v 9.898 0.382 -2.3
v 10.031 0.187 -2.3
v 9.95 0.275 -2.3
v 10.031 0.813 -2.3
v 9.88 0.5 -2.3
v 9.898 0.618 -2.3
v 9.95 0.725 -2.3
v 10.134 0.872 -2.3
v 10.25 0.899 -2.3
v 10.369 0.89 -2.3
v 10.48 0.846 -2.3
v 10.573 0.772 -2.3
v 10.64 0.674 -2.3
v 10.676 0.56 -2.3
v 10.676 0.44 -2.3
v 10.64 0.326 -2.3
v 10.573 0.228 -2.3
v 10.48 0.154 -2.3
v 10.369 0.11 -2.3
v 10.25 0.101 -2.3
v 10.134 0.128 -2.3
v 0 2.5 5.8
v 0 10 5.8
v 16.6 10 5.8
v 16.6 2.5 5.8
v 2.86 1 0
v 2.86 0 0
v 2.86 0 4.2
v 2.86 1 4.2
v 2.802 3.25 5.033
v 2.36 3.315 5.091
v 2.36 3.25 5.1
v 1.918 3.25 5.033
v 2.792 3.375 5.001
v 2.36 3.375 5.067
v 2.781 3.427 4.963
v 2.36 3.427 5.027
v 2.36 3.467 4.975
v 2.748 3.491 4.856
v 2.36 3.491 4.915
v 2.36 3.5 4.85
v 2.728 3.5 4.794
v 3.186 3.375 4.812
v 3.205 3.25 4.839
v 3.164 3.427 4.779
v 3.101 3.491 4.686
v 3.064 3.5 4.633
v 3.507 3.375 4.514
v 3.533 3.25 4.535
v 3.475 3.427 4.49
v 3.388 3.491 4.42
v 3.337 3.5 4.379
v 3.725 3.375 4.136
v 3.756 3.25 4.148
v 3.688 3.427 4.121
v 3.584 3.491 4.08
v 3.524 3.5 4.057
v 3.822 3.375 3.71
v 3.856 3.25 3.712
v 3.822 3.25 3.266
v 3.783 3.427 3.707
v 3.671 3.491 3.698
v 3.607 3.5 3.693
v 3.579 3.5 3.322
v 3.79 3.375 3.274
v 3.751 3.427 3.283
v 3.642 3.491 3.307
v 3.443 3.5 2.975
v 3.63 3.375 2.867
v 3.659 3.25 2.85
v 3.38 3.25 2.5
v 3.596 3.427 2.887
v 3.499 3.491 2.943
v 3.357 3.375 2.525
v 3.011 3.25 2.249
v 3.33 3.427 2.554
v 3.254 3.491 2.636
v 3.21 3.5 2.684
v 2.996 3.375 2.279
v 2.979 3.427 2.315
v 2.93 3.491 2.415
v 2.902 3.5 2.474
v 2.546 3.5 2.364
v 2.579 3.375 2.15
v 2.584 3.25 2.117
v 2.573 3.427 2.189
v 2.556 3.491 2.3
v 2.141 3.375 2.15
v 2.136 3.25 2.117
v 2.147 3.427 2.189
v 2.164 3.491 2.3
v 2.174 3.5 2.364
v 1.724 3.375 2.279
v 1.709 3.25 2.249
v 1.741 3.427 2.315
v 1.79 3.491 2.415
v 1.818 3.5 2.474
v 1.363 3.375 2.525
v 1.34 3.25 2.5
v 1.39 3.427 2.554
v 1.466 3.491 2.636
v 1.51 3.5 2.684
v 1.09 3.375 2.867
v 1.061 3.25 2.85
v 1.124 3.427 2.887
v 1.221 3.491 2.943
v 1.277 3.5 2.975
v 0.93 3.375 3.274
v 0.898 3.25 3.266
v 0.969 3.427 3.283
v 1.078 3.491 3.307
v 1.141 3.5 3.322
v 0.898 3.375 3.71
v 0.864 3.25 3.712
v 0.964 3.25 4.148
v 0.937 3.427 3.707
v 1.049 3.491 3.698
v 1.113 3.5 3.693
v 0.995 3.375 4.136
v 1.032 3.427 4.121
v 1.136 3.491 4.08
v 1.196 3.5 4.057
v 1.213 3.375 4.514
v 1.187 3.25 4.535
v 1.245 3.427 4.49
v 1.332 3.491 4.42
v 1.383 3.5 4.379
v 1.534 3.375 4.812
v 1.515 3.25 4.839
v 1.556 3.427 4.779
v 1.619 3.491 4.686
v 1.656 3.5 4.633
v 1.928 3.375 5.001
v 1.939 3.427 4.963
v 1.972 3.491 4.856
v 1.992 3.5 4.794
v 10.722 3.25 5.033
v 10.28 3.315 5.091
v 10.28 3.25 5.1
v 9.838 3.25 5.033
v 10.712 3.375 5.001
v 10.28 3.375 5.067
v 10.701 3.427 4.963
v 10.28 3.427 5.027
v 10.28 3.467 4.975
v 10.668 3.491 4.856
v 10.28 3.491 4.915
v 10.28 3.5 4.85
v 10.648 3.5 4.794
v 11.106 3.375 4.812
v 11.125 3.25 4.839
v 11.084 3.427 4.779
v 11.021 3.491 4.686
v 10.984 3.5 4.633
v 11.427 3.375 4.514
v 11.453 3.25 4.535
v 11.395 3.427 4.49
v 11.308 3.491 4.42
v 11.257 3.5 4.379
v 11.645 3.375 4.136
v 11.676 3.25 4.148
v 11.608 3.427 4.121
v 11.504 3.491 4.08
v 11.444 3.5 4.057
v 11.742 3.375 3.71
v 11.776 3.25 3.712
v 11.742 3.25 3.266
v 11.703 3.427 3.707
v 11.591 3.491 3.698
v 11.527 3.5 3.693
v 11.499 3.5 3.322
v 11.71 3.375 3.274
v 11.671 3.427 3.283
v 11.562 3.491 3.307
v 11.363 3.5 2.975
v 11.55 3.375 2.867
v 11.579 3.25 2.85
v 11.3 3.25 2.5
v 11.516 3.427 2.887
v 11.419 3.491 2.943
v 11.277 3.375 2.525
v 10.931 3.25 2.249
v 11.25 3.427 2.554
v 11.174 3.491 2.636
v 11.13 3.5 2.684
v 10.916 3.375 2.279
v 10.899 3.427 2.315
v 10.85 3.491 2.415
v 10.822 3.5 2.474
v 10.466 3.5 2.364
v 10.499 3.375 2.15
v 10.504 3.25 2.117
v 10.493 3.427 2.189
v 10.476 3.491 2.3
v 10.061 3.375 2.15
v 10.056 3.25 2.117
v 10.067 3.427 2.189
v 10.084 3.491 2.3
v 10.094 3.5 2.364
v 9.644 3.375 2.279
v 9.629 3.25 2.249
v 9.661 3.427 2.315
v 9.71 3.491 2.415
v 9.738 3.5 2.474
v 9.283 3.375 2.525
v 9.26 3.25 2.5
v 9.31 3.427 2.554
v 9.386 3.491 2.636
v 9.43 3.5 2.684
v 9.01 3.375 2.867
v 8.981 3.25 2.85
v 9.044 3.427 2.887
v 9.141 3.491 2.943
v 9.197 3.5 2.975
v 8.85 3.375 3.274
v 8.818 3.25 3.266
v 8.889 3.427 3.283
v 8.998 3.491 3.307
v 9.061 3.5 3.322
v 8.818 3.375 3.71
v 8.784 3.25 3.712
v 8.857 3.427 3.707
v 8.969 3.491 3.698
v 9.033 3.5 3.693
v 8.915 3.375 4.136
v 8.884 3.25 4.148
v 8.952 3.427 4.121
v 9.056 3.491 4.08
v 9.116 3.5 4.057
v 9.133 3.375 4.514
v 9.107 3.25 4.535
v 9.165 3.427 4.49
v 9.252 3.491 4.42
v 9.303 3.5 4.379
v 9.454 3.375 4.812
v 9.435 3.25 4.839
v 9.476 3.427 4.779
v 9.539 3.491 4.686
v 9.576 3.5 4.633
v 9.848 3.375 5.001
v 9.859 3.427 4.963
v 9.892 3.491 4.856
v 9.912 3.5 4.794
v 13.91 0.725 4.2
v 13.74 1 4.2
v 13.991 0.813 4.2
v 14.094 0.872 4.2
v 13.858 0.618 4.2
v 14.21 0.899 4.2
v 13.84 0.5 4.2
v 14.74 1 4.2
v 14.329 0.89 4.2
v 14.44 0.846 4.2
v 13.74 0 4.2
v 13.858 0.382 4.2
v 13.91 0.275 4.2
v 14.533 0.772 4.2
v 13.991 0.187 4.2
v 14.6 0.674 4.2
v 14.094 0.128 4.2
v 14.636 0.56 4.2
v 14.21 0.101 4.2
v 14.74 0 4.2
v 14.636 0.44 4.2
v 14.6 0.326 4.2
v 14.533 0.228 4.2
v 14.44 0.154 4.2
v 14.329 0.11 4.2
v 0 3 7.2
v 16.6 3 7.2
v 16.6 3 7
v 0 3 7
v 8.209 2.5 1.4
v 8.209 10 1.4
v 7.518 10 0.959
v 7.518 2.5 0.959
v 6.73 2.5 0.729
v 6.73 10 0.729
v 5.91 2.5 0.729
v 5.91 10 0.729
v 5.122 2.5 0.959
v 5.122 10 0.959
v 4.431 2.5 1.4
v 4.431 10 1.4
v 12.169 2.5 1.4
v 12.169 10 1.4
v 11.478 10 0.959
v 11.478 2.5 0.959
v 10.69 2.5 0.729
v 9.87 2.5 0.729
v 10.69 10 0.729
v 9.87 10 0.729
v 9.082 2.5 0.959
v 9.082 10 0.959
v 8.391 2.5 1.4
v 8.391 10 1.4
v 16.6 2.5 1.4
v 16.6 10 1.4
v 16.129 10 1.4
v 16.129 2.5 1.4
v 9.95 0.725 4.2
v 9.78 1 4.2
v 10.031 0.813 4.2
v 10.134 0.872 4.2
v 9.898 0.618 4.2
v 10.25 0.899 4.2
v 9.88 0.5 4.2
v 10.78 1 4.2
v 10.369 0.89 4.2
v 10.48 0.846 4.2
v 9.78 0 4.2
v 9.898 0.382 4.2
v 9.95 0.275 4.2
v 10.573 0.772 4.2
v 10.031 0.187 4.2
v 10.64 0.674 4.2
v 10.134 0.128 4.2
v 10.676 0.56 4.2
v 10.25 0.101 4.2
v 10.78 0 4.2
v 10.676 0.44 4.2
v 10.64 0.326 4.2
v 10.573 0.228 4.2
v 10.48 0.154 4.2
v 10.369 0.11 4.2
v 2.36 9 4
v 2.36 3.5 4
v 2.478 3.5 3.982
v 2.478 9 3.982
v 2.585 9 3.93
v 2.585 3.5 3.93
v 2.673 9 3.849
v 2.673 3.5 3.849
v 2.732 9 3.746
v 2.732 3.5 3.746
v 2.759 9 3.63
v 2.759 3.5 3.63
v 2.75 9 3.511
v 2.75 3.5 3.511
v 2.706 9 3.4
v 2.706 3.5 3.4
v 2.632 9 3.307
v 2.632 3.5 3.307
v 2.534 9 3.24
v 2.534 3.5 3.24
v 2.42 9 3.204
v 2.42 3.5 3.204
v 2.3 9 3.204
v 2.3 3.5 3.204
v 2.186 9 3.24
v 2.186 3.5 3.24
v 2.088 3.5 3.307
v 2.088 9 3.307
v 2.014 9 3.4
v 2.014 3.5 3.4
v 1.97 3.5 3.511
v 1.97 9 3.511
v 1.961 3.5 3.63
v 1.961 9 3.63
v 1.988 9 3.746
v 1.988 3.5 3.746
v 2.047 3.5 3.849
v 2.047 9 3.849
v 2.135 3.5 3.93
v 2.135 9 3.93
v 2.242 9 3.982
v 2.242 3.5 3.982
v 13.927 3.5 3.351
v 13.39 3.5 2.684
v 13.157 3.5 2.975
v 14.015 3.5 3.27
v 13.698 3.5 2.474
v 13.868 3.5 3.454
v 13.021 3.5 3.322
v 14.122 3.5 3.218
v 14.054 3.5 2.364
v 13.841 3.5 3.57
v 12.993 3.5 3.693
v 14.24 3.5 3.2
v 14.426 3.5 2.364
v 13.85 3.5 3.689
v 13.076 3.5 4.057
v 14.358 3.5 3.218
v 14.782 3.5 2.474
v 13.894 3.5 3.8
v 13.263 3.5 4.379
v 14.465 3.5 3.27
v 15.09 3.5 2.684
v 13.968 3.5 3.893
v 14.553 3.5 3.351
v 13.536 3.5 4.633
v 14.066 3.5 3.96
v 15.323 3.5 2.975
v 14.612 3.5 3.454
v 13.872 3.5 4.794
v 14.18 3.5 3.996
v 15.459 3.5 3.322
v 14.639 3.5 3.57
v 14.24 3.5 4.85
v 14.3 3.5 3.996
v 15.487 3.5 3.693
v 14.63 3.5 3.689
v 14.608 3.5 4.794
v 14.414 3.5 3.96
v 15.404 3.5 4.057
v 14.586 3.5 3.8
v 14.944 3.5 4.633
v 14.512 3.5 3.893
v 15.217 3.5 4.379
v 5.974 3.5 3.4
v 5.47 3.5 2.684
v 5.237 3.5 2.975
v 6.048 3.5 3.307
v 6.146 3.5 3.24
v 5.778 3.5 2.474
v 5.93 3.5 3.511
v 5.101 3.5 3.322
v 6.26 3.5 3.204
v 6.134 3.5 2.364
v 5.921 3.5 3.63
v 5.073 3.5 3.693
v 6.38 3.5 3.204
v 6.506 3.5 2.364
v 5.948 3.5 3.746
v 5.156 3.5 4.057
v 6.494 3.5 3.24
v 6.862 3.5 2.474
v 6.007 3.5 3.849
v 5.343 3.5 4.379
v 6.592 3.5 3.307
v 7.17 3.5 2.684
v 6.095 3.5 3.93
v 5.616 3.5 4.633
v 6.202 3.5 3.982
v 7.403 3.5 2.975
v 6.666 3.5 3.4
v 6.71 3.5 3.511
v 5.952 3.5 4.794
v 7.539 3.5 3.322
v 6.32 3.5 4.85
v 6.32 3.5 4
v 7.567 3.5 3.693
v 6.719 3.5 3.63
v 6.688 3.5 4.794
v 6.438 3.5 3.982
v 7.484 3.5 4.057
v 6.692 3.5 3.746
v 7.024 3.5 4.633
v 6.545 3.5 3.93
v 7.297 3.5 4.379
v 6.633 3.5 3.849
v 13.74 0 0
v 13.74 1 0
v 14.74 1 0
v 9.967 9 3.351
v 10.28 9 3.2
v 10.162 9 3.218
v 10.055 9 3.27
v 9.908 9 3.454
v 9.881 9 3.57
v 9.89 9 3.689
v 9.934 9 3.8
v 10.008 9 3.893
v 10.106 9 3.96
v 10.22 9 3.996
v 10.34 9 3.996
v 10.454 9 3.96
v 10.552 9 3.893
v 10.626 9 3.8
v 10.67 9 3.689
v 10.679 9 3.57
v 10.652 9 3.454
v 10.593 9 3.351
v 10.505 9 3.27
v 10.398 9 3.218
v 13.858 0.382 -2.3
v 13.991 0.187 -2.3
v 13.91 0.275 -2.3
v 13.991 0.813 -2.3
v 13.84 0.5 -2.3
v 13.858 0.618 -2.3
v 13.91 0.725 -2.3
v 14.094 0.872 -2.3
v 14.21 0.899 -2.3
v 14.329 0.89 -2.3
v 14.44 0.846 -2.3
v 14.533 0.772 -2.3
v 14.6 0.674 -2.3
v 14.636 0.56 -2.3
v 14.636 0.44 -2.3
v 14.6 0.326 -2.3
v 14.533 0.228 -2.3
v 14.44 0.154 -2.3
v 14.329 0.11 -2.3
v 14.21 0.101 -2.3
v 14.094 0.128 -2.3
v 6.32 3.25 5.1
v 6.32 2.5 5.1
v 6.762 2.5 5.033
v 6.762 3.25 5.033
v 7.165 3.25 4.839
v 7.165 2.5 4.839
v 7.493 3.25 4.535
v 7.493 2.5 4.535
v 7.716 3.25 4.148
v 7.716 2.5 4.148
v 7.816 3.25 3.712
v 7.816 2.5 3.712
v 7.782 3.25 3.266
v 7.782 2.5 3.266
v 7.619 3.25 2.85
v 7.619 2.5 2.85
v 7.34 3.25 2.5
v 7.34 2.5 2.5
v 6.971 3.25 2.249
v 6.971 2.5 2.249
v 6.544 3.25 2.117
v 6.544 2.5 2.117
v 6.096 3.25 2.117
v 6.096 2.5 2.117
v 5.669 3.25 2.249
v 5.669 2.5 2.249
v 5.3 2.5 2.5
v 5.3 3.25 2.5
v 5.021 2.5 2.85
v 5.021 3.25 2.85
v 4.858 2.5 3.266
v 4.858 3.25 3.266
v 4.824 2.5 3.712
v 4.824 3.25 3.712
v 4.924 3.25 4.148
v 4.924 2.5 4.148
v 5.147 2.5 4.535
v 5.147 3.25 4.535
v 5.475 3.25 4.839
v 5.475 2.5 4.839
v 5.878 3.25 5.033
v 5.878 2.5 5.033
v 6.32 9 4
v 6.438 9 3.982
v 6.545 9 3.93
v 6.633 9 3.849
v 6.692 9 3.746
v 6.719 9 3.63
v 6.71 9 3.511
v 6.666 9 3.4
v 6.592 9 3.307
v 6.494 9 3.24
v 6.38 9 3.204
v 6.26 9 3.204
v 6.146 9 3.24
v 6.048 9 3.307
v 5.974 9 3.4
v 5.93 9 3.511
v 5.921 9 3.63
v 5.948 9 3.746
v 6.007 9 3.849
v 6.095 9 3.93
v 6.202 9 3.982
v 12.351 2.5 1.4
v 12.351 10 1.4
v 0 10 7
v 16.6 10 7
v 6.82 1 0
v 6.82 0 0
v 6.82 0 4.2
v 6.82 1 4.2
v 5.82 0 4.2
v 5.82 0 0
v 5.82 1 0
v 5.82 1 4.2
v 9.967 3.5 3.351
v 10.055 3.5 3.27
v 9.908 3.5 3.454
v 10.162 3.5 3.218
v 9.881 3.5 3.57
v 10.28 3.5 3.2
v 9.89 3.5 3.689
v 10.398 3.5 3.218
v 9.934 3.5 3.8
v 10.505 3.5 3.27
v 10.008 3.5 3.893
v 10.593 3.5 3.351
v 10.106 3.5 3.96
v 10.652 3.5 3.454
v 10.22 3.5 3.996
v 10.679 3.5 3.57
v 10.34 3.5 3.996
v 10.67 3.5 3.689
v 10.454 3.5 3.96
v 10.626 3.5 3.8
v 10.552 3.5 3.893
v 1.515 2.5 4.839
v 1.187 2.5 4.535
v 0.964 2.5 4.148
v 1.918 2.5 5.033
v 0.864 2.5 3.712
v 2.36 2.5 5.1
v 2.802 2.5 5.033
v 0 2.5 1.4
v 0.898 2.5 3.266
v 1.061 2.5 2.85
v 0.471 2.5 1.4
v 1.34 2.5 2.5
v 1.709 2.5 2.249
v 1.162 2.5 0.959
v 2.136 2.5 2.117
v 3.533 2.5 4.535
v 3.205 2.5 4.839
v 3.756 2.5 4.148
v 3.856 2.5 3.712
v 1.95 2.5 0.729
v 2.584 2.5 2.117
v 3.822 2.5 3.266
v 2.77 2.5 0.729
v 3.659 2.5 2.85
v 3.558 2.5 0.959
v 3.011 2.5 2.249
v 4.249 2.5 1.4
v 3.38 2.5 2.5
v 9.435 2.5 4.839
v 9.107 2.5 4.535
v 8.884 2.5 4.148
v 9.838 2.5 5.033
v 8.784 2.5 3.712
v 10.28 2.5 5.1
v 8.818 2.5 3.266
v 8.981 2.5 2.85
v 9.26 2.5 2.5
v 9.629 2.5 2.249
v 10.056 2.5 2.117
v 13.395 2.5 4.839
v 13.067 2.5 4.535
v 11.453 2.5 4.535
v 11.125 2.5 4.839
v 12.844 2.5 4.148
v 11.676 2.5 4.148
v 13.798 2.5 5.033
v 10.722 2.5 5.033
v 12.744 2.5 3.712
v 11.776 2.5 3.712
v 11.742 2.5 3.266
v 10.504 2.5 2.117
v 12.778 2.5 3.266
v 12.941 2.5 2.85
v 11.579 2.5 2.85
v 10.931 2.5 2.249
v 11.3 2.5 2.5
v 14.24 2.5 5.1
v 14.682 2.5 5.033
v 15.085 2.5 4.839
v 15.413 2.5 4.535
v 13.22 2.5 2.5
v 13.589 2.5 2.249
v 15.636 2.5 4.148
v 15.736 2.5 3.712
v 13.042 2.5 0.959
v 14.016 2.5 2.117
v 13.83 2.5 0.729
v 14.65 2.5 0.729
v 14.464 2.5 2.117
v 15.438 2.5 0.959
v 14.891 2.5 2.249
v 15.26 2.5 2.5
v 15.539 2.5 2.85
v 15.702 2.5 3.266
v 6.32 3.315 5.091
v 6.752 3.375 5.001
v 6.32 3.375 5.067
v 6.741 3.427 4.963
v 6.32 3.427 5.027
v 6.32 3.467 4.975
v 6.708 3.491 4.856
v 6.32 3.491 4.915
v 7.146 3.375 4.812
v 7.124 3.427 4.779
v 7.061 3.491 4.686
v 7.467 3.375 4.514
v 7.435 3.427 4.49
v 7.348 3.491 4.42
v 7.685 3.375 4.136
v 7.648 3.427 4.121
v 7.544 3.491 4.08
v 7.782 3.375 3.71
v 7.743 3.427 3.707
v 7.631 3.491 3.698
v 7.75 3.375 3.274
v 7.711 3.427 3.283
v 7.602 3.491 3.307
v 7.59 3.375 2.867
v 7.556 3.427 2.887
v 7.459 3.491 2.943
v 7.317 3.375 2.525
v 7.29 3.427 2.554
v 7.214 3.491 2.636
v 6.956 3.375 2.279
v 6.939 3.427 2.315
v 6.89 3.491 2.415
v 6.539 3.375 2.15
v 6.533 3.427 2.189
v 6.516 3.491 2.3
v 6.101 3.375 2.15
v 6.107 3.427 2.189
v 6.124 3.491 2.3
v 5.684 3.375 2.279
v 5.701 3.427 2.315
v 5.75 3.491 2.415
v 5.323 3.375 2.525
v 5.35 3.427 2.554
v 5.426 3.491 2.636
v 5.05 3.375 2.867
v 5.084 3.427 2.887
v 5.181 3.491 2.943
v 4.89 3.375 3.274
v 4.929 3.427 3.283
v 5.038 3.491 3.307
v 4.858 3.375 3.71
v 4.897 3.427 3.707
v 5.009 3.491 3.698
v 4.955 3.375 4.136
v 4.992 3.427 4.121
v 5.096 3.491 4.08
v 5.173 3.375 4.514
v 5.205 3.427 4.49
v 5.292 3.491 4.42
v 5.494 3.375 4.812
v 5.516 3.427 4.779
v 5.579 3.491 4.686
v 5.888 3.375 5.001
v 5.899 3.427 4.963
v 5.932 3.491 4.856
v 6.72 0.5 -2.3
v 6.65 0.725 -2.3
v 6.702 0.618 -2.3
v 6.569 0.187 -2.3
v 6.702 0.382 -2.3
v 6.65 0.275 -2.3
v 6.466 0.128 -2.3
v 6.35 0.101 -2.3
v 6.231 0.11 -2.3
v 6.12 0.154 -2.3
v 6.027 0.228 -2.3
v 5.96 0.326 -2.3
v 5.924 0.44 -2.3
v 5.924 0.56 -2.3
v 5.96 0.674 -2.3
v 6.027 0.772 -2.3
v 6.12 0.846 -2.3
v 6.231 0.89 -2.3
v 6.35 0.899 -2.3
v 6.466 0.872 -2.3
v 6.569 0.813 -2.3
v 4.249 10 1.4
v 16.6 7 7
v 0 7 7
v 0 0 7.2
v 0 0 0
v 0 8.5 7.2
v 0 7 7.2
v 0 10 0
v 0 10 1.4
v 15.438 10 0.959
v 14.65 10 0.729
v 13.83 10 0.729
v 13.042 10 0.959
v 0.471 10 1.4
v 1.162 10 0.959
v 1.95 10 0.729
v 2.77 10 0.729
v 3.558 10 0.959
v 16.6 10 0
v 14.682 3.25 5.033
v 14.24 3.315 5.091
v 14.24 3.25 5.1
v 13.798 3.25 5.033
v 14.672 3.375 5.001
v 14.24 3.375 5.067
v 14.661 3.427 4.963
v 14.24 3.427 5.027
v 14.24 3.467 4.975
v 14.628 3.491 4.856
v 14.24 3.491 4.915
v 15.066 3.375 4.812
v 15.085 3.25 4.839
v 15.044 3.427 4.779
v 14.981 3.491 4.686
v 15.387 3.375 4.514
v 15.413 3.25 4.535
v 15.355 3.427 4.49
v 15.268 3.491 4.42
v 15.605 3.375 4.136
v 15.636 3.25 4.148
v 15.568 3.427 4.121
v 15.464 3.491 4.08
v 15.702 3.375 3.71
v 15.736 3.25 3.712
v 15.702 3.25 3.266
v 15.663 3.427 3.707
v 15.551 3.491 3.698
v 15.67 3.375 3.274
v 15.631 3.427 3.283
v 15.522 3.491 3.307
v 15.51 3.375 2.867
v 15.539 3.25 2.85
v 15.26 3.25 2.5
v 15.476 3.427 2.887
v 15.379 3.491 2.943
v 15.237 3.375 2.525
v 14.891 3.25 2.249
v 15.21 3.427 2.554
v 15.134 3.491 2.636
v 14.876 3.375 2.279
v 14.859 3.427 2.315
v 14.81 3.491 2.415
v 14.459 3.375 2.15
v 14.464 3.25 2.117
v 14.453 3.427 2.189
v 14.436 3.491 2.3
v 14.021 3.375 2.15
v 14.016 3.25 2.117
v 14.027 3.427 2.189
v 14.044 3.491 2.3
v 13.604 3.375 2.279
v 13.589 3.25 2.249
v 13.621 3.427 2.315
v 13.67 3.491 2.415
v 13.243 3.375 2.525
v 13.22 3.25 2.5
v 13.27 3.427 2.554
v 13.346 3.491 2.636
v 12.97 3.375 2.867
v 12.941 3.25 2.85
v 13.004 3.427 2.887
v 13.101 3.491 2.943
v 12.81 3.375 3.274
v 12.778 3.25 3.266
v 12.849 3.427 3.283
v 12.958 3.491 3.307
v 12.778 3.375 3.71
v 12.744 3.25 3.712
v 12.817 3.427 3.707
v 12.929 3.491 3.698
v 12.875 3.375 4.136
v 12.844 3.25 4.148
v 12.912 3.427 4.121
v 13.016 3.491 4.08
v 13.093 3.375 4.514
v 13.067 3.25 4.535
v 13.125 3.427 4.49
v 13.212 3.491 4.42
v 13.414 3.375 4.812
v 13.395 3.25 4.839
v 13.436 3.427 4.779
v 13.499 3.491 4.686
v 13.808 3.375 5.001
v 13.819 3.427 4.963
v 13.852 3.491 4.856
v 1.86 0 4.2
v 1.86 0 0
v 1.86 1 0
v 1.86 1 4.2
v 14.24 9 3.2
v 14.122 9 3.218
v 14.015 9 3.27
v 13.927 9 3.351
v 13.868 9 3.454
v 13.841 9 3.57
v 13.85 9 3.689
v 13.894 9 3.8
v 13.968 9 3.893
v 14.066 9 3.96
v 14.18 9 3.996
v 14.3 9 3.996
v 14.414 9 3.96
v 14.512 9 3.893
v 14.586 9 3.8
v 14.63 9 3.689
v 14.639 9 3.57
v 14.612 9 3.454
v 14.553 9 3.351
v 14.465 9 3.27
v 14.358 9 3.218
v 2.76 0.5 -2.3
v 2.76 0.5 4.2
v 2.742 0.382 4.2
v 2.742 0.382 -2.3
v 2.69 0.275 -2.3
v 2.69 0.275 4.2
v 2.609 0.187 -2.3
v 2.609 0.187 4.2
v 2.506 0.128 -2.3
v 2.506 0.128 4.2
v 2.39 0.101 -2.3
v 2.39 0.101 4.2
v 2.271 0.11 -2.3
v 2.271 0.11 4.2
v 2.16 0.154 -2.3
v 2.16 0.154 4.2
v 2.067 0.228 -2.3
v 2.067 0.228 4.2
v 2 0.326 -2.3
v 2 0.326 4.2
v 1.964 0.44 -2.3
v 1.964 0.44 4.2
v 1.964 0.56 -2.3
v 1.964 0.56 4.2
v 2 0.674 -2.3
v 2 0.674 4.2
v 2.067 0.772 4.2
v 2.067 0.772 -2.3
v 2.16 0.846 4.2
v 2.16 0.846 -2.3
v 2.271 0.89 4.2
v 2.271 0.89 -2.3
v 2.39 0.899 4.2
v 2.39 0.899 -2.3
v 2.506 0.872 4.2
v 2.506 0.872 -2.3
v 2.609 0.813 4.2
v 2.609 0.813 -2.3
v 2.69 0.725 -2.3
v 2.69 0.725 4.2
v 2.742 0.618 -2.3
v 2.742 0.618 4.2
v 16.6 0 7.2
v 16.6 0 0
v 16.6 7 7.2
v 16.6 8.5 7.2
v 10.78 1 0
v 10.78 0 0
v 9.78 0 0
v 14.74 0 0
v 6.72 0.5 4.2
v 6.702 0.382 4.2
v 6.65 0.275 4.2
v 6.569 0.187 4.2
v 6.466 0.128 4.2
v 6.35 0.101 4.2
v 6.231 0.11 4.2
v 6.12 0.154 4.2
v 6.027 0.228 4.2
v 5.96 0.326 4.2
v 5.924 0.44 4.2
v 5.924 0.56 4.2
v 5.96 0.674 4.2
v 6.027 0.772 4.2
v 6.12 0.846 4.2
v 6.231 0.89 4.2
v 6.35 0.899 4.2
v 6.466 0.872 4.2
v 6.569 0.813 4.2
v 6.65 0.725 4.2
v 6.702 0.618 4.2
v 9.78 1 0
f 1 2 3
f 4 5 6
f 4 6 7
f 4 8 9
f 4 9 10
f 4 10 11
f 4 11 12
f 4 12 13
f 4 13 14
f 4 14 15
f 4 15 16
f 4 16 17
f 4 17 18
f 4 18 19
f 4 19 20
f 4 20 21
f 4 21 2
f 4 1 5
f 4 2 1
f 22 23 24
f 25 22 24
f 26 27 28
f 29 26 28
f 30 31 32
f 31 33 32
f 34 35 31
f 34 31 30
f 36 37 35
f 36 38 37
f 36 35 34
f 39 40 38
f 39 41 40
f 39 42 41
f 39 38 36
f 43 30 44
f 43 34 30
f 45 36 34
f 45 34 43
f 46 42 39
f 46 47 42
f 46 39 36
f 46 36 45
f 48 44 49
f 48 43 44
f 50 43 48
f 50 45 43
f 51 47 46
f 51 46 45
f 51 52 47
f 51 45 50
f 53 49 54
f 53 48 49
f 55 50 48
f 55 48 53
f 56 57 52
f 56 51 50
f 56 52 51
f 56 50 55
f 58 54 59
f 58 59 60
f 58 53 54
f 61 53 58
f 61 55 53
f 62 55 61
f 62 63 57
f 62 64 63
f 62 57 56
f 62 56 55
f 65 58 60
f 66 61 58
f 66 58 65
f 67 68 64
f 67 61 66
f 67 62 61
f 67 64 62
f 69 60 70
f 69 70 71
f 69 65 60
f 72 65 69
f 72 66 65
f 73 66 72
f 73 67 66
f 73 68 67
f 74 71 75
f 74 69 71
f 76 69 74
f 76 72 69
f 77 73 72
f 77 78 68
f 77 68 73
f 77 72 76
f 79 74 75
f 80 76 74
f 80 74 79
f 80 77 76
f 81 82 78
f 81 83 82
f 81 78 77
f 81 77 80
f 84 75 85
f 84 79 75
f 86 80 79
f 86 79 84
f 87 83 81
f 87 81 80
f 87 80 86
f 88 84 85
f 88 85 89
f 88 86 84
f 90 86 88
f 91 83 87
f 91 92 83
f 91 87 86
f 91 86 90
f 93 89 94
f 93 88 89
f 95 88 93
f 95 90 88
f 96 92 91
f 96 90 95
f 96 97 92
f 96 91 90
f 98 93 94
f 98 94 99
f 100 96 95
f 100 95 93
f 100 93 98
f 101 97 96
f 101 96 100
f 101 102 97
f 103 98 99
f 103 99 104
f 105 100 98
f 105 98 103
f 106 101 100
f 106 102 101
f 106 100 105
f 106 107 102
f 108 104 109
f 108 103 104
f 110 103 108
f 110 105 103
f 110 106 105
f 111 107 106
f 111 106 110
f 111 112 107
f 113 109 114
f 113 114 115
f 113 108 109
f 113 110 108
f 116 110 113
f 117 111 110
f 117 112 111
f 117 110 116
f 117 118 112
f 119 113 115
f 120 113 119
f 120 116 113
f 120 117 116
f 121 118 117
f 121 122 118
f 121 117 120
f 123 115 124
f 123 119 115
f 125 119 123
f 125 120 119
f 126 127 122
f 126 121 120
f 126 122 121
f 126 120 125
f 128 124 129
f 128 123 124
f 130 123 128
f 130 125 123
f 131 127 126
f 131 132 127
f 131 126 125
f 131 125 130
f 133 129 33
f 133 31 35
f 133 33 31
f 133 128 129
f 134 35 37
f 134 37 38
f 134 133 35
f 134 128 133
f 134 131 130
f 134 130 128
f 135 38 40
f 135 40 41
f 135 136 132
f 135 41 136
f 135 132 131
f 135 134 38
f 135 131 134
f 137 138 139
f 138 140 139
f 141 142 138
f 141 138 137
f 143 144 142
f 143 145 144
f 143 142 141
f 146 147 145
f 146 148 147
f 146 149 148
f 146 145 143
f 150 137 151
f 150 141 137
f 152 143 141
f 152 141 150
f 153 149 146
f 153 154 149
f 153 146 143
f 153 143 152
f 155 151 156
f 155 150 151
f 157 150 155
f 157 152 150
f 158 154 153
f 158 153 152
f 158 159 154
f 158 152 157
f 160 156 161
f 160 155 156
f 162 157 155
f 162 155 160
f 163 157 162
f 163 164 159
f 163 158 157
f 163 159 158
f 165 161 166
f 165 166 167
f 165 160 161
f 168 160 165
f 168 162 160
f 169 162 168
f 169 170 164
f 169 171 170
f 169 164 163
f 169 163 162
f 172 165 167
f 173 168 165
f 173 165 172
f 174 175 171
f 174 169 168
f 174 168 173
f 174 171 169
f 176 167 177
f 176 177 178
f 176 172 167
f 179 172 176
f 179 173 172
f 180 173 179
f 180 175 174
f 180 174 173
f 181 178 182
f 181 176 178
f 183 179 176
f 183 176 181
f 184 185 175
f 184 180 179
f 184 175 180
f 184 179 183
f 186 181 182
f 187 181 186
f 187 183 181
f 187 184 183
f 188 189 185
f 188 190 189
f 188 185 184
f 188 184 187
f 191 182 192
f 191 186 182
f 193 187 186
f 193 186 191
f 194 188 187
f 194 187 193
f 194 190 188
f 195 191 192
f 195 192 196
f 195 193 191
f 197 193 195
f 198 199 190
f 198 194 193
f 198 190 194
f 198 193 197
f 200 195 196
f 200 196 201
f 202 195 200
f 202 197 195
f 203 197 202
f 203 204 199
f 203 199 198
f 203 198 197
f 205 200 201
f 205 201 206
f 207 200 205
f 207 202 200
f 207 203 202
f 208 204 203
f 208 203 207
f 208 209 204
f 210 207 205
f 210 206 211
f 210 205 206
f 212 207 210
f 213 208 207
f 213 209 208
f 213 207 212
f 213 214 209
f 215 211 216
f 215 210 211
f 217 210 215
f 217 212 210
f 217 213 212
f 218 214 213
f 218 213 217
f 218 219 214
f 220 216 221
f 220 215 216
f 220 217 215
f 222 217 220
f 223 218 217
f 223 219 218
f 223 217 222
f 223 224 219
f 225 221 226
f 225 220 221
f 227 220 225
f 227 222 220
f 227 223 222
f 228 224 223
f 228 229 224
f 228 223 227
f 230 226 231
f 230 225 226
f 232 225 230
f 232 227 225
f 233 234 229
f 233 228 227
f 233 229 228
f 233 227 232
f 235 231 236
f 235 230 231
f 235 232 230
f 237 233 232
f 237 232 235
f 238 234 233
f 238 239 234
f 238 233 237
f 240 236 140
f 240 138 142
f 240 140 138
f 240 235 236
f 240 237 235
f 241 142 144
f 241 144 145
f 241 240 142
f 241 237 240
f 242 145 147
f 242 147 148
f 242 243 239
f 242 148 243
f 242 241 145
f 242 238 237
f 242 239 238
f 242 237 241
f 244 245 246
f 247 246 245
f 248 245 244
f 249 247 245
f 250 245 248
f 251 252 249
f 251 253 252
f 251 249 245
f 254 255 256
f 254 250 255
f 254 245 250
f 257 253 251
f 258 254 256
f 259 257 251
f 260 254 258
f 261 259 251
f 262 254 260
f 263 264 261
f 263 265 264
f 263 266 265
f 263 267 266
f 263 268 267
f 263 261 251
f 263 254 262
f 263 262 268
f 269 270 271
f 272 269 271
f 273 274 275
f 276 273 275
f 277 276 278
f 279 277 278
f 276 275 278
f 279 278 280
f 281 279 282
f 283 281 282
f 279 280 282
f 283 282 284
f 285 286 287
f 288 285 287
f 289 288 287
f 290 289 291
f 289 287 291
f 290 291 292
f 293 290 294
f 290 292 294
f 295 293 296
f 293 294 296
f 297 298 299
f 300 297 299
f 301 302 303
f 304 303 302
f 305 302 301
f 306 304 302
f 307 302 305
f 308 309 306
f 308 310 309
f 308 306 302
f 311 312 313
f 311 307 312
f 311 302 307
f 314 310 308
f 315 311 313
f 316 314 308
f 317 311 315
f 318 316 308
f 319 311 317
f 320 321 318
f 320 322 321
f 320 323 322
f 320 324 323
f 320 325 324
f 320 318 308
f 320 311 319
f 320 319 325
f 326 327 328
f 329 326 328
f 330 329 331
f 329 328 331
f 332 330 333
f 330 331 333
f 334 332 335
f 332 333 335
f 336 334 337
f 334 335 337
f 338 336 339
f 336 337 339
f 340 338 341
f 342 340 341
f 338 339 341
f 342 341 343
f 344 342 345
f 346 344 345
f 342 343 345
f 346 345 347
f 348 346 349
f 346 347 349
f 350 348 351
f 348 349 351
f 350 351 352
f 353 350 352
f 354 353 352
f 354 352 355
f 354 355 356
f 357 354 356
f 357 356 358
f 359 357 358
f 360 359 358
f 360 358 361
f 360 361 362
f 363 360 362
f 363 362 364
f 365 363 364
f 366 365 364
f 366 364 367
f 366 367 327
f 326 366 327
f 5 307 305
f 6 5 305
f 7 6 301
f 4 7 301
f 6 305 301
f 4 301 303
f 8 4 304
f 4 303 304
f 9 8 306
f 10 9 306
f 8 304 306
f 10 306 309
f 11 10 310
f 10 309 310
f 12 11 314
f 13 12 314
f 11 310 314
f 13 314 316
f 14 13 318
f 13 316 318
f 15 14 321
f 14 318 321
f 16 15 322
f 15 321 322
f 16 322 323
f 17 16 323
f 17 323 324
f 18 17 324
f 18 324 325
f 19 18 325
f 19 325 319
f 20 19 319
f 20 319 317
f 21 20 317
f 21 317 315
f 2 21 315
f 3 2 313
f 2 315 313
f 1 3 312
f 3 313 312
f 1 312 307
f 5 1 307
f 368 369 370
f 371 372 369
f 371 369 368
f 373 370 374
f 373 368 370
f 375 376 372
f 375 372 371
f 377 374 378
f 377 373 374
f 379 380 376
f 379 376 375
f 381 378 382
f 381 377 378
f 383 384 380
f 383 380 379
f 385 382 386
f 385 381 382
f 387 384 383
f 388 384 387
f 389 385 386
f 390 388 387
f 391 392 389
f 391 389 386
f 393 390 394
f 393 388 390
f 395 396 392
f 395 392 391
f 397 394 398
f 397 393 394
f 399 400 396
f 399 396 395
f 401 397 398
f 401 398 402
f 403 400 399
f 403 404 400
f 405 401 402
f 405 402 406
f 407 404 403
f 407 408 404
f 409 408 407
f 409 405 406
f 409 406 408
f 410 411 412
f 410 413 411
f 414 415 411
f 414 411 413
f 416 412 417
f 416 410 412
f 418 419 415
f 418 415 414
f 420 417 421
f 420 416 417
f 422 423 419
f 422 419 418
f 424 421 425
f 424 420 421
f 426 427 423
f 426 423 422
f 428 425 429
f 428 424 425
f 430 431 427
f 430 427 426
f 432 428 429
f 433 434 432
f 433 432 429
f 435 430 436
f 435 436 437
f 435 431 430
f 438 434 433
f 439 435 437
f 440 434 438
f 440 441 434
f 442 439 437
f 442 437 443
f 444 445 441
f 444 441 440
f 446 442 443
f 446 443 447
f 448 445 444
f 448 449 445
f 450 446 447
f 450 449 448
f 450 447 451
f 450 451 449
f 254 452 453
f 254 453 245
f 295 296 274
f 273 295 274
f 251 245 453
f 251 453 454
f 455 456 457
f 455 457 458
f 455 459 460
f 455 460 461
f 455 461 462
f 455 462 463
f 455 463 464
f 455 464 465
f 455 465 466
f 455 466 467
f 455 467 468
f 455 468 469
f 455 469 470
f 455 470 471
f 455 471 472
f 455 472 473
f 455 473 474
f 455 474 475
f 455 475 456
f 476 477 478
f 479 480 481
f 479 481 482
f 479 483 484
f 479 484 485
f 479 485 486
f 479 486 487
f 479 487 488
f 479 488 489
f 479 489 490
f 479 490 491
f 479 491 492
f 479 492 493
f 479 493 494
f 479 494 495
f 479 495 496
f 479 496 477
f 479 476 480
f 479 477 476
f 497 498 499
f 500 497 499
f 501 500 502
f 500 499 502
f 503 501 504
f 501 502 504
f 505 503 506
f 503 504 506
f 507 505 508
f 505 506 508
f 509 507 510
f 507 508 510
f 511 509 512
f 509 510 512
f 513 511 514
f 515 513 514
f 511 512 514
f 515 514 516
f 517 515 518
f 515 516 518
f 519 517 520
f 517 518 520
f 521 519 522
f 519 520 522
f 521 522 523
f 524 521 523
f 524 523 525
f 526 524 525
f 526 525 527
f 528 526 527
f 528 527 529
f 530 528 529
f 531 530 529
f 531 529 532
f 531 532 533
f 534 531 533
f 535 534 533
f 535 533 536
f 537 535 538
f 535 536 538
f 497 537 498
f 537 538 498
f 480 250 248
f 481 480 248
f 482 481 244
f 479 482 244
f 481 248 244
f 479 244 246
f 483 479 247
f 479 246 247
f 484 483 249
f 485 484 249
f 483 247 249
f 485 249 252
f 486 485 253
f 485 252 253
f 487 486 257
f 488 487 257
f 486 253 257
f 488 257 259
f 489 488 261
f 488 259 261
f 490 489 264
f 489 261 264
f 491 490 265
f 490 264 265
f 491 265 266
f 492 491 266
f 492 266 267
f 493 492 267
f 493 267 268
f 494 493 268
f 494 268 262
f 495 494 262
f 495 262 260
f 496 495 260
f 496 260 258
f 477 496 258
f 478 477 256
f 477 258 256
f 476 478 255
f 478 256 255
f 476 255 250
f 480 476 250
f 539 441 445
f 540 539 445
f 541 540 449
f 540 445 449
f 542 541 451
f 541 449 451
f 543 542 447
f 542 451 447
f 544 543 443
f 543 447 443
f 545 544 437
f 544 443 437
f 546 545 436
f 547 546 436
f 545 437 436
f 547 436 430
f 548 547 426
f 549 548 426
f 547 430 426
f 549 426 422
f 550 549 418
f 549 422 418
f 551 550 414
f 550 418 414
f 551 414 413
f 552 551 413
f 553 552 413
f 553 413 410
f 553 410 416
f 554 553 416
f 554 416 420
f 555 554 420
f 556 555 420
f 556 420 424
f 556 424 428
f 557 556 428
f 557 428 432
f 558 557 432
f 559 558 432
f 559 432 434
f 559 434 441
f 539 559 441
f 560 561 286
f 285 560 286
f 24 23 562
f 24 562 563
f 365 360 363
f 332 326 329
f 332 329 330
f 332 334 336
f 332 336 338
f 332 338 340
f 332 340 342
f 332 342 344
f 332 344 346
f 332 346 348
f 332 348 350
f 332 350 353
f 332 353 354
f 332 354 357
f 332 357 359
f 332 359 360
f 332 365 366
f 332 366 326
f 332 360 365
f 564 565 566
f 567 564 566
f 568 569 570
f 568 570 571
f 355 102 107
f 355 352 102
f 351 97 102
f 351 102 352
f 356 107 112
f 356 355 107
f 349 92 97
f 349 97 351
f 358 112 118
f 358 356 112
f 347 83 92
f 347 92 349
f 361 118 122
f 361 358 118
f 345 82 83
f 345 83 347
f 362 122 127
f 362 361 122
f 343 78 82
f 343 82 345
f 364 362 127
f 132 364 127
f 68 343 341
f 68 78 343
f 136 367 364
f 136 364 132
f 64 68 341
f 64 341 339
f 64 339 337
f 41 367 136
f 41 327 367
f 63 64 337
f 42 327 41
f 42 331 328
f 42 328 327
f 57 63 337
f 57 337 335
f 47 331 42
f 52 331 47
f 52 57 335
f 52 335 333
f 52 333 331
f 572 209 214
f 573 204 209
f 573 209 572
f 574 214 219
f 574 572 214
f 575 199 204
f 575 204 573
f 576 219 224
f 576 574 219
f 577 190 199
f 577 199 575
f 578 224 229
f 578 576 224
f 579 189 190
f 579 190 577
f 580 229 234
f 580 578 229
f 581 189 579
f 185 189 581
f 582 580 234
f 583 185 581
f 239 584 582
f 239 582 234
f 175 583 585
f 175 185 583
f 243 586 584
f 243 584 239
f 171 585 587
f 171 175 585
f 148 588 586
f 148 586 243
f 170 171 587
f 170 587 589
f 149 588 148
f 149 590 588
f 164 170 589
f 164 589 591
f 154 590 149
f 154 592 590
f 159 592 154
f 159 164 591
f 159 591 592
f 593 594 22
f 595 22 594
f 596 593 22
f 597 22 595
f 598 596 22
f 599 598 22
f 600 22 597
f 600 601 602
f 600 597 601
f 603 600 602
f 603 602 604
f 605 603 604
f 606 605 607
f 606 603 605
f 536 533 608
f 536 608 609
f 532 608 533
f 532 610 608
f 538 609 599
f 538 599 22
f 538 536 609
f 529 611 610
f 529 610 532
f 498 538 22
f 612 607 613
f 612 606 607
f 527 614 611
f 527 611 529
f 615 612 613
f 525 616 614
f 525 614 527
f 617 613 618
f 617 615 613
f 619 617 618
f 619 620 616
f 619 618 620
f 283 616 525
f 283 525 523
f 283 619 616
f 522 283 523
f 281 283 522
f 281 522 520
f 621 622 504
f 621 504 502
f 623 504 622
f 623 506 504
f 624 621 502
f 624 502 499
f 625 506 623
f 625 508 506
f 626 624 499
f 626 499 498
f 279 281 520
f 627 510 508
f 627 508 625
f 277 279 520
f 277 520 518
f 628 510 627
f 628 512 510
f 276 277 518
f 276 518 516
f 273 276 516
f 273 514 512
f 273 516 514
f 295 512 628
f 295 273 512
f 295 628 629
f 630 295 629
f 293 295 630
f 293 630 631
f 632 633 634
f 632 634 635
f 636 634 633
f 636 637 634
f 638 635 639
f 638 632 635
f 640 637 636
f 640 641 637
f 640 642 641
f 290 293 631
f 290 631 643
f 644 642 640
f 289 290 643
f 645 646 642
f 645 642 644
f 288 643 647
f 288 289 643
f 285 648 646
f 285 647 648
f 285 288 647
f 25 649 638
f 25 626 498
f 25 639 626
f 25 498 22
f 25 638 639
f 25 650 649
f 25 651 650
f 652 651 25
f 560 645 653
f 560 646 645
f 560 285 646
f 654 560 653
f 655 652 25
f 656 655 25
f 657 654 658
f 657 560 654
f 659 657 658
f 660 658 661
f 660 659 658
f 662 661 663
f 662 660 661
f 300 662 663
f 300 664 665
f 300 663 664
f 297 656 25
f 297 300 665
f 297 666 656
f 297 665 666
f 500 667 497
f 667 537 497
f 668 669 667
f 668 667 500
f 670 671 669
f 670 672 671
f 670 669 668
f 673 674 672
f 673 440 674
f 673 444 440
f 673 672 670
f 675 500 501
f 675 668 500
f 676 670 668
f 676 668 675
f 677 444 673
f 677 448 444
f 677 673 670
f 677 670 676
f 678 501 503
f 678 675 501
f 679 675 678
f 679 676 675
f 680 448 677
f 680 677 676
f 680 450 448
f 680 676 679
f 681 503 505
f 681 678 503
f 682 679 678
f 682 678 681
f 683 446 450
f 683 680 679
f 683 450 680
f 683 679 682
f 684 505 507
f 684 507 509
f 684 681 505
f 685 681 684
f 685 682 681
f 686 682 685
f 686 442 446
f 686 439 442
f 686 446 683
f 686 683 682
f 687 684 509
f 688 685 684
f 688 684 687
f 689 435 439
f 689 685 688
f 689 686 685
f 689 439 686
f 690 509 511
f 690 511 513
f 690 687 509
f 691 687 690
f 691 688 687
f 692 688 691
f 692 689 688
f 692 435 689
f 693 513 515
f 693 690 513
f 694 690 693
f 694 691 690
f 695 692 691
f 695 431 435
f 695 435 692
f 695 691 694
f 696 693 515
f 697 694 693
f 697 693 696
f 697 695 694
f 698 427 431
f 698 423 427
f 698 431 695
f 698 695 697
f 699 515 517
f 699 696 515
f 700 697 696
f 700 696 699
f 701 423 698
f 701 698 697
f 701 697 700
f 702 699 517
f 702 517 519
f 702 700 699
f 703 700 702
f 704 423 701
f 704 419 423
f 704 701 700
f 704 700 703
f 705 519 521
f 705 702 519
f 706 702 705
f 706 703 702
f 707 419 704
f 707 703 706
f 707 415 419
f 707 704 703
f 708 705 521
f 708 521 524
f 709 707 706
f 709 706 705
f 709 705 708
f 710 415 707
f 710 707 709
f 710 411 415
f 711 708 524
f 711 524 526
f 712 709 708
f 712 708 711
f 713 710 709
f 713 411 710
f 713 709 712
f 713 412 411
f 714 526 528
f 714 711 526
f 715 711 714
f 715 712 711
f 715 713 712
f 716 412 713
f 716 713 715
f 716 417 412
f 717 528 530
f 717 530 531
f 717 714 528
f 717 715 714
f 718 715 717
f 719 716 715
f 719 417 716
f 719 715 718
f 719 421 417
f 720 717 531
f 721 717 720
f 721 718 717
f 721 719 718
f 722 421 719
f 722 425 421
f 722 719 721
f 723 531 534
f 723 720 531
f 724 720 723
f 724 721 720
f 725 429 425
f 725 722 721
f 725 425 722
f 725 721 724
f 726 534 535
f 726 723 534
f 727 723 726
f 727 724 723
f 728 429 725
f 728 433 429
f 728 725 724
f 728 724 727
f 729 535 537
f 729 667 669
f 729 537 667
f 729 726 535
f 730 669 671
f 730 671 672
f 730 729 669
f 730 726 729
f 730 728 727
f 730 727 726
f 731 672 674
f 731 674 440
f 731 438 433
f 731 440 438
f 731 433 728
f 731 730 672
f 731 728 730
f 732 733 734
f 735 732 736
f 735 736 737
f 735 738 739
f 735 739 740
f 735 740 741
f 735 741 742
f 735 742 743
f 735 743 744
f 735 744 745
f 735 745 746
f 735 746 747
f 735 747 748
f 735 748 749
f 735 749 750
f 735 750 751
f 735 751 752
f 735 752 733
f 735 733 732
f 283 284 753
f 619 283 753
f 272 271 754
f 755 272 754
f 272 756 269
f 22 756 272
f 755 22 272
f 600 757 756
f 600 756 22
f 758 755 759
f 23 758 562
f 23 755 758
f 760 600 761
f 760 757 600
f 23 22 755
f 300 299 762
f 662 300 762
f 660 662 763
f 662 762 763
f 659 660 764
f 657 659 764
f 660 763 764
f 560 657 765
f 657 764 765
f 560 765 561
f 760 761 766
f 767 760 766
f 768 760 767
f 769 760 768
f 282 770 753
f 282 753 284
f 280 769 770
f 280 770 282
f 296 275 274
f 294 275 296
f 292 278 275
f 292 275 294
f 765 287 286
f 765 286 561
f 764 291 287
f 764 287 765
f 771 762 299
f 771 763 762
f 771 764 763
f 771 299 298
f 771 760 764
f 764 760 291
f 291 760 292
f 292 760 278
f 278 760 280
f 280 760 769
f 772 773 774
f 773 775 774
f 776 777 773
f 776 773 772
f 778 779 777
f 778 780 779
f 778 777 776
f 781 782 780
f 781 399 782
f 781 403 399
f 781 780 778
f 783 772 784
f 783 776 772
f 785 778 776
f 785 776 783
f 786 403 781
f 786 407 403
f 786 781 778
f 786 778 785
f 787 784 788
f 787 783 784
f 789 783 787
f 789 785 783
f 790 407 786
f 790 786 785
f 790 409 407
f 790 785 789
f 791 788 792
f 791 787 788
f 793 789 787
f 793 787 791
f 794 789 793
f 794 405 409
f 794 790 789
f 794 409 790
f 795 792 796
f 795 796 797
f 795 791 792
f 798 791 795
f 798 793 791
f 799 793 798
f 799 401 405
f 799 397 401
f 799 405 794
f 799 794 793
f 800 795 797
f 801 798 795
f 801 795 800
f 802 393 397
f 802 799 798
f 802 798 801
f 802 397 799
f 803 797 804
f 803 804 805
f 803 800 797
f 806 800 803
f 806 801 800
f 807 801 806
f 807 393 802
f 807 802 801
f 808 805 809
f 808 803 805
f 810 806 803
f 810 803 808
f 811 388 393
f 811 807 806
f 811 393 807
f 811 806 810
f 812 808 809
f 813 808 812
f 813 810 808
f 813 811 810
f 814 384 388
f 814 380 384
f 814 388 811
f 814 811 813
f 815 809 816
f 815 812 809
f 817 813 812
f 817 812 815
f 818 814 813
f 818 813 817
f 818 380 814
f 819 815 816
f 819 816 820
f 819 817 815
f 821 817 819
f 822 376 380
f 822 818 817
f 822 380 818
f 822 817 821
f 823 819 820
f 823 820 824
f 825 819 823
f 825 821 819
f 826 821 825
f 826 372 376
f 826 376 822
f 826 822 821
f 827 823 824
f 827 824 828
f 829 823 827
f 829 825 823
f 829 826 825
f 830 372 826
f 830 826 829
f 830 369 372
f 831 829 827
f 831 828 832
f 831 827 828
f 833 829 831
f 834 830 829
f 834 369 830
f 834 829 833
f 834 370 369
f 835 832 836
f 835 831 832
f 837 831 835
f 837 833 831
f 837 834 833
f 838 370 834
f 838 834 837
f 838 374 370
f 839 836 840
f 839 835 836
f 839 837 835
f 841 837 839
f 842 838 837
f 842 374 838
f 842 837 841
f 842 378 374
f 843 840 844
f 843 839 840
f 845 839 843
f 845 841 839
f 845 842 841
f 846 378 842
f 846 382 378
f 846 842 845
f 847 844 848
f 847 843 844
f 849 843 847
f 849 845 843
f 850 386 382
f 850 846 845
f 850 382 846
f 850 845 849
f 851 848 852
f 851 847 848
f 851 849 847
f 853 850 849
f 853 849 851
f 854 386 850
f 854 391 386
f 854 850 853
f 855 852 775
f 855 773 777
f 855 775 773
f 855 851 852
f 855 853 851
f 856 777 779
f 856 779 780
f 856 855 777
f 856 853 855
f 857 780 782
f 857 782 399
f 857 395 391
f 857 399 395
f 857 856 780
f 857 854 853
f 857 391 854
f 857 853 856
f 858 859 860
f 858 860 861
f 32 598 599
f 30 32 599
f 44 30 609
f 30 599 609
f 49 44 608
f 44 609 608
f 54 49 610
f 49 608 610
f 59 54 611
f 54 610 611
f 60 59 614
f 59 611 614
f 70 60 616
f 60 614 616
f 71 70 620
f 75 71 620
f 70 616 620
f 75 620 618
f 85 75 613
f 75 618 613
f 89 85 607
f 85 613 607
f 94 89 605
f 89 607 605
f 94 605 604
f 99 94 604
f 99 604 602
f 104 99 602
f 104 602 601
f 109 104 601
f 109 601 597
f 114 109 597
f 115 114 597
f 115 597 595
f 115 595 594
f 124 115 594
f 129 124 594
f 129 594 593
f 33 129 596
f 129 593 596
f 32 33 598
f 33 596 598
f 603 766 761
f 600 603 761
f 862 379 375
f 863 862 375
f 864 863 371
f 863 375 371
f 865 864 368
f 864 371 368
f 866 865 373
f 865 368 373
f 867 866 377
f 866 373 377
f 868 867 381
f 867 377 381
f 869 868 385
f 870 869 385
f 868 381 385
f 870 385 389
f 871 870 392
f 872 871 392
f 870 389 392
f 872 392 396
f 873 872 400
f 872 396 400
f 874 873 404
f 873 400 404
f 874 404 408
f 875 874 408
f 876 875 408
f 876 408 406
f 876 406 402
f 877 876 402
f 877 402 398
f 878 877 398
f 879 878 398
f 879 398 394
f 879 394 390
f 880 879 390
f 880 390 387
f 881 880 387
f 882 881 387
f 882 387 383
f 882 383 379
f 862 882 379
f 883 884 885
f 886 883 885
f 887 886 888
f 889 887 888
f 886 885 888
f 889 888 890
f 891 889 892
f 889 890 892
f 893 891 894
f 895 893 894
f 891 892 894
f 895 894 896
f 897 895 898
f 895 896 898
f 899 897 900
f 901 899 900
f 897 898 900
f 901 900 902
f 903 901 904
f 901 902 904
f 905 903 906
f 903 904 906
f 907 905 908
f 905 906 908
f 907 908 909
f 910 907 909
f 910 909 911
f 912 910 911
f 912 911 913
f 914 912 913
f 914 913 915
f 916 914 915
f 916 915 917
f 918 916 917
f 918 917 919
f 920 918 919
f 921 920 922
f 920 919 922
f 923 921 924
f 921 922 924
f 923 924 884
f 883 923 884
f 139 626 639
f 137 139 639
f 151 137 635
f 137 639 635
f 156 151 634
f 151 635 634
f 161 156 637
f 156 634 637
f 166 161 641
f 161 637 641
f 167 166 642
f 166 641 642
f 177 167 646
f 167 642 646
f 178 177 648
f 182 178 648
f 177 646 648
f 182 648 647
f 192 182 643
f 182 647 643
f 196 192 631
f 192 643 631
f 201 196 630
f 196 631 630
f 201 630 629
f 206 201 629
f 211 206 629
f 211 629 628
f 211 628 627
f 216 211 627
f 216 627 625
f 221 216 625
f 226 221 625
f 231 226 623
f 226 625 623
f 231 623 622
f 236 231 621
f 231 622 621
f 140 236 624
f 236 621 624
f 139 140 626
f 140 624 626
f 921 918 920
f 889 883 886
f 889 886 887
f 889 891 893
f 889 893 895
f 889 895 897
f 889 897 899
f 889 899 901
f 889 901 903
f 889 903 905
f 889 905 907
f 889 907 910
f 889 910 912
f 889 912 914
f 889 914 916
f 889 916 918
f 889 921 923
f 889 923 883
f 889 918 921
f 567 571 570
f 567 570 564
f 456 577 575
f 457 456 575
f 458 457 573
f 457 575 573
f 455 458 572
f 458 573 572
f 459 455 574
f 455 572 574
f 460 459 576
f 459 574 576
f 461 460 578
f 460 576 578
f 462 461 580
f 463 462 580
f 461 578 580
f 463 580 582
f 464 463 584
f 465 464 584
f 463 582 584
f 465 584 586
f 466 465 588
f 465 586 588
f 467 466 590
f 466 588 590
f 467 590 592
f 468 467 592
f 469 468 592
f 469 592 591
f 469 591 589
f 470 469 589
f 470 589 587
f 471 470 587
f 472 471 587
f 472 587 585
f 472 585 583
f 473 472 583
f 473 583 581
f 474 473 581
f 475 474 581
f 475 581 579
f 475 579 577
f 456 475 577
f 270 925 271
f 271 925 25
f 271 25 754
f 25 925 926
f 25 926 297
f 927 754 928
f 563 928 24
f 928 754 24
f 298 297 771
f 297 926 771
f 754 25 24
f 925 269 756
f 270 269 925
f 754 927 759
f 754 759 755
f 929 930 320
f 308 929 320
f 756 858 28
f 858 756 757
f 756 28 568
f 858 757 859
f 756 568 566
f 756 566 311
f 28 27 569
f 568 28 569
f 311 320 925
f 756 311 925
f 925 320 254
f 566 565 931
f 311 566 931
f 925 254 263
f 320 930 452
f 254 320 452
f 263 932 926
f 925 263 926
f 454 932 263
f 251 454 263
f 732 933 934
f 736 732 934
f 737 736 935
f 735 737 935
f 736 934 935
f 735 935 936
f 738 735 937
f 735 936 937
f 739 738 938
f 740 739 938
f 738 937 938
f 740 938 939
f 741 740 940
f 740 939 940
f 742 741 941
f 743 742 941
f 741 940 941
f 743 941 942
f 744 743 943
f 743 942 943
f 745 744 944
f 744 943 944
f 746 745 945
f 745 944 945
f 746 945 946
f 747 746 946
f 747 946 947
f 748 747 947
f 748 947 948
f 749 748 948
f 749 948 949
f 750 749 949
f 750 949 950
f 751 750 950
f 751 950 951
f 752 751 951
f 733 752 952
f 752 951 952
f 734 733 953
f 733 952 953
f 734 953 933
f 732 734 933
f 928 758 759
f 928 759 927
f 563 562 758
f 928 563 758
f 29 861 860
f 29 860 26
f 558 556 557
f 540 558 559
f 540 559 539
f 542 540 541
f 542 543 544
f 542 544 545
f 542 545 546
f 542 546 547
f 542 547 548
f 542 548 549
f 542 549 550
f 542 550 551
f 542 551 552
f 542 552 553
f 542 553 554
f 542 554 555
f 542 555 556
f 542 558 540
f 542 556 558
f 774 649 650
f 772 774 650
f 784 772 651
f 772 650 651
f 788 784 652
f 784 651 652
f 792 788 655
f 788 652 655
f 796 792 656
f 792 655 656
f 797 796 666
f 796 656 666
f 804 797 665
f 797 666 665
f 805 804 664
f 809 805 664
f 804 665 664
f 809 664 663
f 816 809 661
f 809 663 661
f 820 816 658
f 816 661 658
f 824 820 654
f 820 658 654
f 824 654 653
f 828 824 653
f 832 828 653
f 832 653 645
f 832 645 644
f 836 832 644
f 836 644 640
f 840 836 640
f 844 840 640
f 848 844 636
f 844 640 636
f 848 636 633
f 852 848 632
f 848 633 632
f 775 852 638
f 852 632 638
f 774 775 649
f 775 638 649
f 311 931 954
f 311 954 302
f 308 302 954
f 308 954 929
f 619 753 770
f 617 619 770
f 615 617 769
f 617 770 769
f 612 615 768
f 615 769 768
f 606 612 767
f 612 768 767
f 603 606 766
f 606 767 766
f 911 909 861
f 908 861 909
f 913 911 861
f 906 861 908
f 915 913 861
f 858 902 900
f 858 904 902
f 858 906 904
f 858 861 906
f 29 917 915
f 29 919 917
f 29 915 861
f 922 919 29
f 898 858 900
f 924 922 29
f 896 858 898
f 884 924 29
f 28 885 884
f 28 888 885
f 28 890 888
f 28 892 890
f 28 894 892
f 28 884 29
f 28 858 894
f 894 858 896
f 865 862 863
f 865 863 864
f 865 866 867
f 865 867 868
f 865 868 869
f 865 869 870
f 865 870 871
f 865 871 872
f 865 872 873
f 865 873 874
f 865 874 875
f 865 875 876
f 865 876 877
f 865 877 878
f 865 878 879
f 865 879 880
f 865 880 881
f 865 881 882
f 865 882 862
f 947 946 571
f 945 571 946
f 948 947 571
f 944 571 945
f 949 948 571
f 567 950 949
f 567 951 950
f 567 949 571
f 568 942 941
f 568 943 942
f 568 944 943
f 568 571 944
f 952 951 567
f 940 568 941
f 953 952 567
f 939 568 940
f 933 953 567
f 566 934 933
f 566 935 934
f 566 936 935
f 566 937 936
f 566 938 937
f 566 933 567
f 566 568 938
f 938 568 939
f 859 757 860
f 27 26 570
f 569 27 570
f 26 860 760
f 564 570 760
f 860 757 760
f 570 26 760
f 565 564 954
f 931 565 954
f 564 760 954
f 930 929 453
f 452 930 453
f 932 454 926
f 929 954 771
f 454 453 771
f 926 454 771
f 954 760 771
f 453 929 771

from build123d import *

# Parameters (mm, degrees)
SKETCH_1_W          = 16.6
SKETCH_1_H          = 10
EXTRUDE_1_DEPTH     = 7.2
SKETCH_2_W          = 1.17709233
SKETCH_2_H          = 4
CUT_EXTRUDE_1_DEPTH = 21.673654733
CUT_EXTRUDE_2_DEPTH = 21.673654733
CUT_EXTRUDE_4_DEPTH = 7.5
SKETCH_12_R         = 0.4
EXTRUDE_8_DEPTH     = 6.5
SKETCH_13_R         = 1.5
EXTRUDE_9_DEPTH     = 1
FILLET_2_R          = 0.25
SKETCH_14_W         = 1
SKETCH_14_H         = 4.2
CUT_EXTRUDE_7_DEPTH = 1
SKETCH_15_R         = 0.4
EXTRUDE_10_DEPTH    = 6.5
CUT_EXTRUDE_9_DEPTH = 7.5


with BuildPart() as part:
    # 草图1 → 凸台-拉伸1 (new body)
    with BuildSketch(Plane.XY):
        with Locations((8.3, 5)):
            Rectangle(SKETCH_1_W, SKETCH_1_H)
    extrude(amount=EXTRUDE_1_DEPTH)

    # 草图2 → 切除-拉伸1 (cut, through all)
    with BuildSketch(Plane(origin=(16.6, 0, 0), x_dir=(0, 0, -1), z_dir=(1, 0, 0))):
        with Locations((-7.588546165, 5)):
            Rectangle(SKETCH_2_W, SKETCH_2_H)
    extrude(amount=-CUT_EXTRUDE_1_DEPTH, mode=Mode.SUBTRACT)

    # 草图3 → 切除-拉伸2 (cut, through all)
    with BuildSketch(Plane(origin=(16.6, 0, 0), x_dir=(0, 0, -1), z_dir=(1, 0, 0))):
        Polygon((-7, 10), (-7.2, 8.5), (-7.2, 10), align=None)
    extrude(amount=-CUT_EXTRUDE_2_DEPTH, mode=Mode.SUBTRACT)

    # 草图6 → 切除-拉伸4 (cut)
    with BuildSketch(Plane(origin=(0, 10, 0), x_dir=(1, 0, 0), z_dir=(0, 1, 0))):
        Polygon((0.5, -1.4), (0.391822444, -1.4), (0, -1.4), (0, -5.8), (0.391822444, -5.8), (0.5, -5.8), (16.6, -5.8), (16.6, -1.4), align=None)
    extrude(amount=-CUT_EXTRUDE_4_DEPTH, mode=Mode.SUBTRACT)

    # 草图12 → 凸台-拉伸8 (add)
    with BuildSketch(Plane(origin=(0, 2.5, 0), x_dir=(1, 0, 0), z_dir=(0, 1, 0))):
        with Locations(Location((6.32, -3.6, 0), (0, 0, 270))):
            Circle(SKETCH_12_R)
        with Locations(Location((2.36, -3.6, 0), (0, 0, 270))):
            Circle(SKETCH_12_R)
        with Locations(Location((14.24, -3.6, 0), (0, 0, 90))):
            Circle(SKETCH_12_R)
        with Locations(Location((10.28, -3.6, 0), (0, 0, 90))):
            Circle(SKETCH_12_R)
    extrude(amount=EXTRUDE_8_DEPTH)

    # 草图13 → 凸台-拉伸9 (add)
    with BuildSketch(Plane(origin=(0, 2.5, 0), x_dir=(1, 0, 0), z_dir=(0, 1, 0))):
        with Locations(Location((14.24, -3.6, 0), (0, 0, 270))):
            Circle(SKETCH_13_R)
        with Locations(Location((10.28, -3.6, 0), (0, 0, 270))):
            Circle(SKETCH_13_R)
        with Locations(Location((6.32, -3.6, 0), (0, 0, 270))):
            Circle(SKETCH_13_R)
        with Locations(Location((2.36, -3.6, 0), (0, 0, 270))):
            Circle(SKETCH_13_R)
    extrude(amount=EXTRUDE_9_DEPTH)

    # 圆角2
    fillet_2_edges = [part.edges().sort_by_distance(p)[0] for p in [
        (14.24, 3.5, 2.1),
        (10.28, 3.5, 2.1),
        (6.32, 3.5, 2.1),
        (2.36, 3.5, 2.1),
    ]]
    fillet(fillet_2_edges, radius=FILLET_2_R)

    # 草图14 → 切除-拉伸7 (cut)
    with BuildSketch(Plane.XZ):
        with Locations((2.36, 2.1)):
            Rectangle(SKETCH_14_W, SKETCH_14_H)
        with Locations((6.32, 2.1)):
            Rectangle(SKETCH_14_W, SKETCH_14_H)
        with Locations((10.28, 2.1)):
            Rectangle(SKETCH_14_W, SKETCH_14_H)
        with Locations((14.24, 2.1)):
            Rectangle(SKETCH_14_W, SKETCH_14_H)
    extrude(amount=-CUT_EXTRUDE_7_DEPTH, mode=Mode.SUBTRACT)

    # 草图15 → 凸台-拉伸10 (add)
    with BuildSketch(Plane(origin=(0, 0, 4.2), x_dir=(-1, 0, 0), z_dir=(0, 0, -1))):
        with Locations(Location((-2.36, 0.5, 0), (0, 0, 180))):
            Circle(SKETCH_15_R)
        with Locations(Location((-6.32, 0.5, 0), (0, 0, 180))):
            Circle(SKETCH_15_R)
        with Locations((-10.28, 0.5)):
            Circle(SKETCH_15_R)
        with Locations((-14.24, 0.5)):
            Circle(SKETCH_15_R)
    extrude(amount=EXTRUDE_10_DEPTH)

    # 草图16 → 切除-拉伸9 (cut)
    with BuildSketch(Plane(origin=(0, 10, 0), x_dir=(1, 0, 0), z_dir=(0, 1, 0))):
        with BuildLine():
            Line((0.470555637, -1.4), (4.249444363, -1.4))
            ThreePointArc((4.249444363, -1.4), (2.36, -0.7), (0.470555637, -1.4))
        make_face()
        with BuildLine():
            Line((12.350555637, -1.4), (16.129444363, -1.4))
            ThreePointArc((16.129444363, -1.4), (14.24, -0.7), (12.350555637, -1.4))
        make_face()
        with BuildLine():
            Line((8.390555637, -1.4), (12.169444363, -1.4))
            ThreePointArc((12.169444363, -1.4), (10.28, -0.7), (8.390555637, -1.4))
        make_face()
        with BuildLine():
            Line((4.430555637, -1.4), (8.209444363, -1.4))
            ThreePointArc((8.209444363, -1.4), (6.32, -0.7), (4.430555637, -1.4))
        make_face()
    extrude(amount=-CUT_EXTRUDE_9_DEPTH, mode=Mode.SUBTRACT)


solid = part.part
